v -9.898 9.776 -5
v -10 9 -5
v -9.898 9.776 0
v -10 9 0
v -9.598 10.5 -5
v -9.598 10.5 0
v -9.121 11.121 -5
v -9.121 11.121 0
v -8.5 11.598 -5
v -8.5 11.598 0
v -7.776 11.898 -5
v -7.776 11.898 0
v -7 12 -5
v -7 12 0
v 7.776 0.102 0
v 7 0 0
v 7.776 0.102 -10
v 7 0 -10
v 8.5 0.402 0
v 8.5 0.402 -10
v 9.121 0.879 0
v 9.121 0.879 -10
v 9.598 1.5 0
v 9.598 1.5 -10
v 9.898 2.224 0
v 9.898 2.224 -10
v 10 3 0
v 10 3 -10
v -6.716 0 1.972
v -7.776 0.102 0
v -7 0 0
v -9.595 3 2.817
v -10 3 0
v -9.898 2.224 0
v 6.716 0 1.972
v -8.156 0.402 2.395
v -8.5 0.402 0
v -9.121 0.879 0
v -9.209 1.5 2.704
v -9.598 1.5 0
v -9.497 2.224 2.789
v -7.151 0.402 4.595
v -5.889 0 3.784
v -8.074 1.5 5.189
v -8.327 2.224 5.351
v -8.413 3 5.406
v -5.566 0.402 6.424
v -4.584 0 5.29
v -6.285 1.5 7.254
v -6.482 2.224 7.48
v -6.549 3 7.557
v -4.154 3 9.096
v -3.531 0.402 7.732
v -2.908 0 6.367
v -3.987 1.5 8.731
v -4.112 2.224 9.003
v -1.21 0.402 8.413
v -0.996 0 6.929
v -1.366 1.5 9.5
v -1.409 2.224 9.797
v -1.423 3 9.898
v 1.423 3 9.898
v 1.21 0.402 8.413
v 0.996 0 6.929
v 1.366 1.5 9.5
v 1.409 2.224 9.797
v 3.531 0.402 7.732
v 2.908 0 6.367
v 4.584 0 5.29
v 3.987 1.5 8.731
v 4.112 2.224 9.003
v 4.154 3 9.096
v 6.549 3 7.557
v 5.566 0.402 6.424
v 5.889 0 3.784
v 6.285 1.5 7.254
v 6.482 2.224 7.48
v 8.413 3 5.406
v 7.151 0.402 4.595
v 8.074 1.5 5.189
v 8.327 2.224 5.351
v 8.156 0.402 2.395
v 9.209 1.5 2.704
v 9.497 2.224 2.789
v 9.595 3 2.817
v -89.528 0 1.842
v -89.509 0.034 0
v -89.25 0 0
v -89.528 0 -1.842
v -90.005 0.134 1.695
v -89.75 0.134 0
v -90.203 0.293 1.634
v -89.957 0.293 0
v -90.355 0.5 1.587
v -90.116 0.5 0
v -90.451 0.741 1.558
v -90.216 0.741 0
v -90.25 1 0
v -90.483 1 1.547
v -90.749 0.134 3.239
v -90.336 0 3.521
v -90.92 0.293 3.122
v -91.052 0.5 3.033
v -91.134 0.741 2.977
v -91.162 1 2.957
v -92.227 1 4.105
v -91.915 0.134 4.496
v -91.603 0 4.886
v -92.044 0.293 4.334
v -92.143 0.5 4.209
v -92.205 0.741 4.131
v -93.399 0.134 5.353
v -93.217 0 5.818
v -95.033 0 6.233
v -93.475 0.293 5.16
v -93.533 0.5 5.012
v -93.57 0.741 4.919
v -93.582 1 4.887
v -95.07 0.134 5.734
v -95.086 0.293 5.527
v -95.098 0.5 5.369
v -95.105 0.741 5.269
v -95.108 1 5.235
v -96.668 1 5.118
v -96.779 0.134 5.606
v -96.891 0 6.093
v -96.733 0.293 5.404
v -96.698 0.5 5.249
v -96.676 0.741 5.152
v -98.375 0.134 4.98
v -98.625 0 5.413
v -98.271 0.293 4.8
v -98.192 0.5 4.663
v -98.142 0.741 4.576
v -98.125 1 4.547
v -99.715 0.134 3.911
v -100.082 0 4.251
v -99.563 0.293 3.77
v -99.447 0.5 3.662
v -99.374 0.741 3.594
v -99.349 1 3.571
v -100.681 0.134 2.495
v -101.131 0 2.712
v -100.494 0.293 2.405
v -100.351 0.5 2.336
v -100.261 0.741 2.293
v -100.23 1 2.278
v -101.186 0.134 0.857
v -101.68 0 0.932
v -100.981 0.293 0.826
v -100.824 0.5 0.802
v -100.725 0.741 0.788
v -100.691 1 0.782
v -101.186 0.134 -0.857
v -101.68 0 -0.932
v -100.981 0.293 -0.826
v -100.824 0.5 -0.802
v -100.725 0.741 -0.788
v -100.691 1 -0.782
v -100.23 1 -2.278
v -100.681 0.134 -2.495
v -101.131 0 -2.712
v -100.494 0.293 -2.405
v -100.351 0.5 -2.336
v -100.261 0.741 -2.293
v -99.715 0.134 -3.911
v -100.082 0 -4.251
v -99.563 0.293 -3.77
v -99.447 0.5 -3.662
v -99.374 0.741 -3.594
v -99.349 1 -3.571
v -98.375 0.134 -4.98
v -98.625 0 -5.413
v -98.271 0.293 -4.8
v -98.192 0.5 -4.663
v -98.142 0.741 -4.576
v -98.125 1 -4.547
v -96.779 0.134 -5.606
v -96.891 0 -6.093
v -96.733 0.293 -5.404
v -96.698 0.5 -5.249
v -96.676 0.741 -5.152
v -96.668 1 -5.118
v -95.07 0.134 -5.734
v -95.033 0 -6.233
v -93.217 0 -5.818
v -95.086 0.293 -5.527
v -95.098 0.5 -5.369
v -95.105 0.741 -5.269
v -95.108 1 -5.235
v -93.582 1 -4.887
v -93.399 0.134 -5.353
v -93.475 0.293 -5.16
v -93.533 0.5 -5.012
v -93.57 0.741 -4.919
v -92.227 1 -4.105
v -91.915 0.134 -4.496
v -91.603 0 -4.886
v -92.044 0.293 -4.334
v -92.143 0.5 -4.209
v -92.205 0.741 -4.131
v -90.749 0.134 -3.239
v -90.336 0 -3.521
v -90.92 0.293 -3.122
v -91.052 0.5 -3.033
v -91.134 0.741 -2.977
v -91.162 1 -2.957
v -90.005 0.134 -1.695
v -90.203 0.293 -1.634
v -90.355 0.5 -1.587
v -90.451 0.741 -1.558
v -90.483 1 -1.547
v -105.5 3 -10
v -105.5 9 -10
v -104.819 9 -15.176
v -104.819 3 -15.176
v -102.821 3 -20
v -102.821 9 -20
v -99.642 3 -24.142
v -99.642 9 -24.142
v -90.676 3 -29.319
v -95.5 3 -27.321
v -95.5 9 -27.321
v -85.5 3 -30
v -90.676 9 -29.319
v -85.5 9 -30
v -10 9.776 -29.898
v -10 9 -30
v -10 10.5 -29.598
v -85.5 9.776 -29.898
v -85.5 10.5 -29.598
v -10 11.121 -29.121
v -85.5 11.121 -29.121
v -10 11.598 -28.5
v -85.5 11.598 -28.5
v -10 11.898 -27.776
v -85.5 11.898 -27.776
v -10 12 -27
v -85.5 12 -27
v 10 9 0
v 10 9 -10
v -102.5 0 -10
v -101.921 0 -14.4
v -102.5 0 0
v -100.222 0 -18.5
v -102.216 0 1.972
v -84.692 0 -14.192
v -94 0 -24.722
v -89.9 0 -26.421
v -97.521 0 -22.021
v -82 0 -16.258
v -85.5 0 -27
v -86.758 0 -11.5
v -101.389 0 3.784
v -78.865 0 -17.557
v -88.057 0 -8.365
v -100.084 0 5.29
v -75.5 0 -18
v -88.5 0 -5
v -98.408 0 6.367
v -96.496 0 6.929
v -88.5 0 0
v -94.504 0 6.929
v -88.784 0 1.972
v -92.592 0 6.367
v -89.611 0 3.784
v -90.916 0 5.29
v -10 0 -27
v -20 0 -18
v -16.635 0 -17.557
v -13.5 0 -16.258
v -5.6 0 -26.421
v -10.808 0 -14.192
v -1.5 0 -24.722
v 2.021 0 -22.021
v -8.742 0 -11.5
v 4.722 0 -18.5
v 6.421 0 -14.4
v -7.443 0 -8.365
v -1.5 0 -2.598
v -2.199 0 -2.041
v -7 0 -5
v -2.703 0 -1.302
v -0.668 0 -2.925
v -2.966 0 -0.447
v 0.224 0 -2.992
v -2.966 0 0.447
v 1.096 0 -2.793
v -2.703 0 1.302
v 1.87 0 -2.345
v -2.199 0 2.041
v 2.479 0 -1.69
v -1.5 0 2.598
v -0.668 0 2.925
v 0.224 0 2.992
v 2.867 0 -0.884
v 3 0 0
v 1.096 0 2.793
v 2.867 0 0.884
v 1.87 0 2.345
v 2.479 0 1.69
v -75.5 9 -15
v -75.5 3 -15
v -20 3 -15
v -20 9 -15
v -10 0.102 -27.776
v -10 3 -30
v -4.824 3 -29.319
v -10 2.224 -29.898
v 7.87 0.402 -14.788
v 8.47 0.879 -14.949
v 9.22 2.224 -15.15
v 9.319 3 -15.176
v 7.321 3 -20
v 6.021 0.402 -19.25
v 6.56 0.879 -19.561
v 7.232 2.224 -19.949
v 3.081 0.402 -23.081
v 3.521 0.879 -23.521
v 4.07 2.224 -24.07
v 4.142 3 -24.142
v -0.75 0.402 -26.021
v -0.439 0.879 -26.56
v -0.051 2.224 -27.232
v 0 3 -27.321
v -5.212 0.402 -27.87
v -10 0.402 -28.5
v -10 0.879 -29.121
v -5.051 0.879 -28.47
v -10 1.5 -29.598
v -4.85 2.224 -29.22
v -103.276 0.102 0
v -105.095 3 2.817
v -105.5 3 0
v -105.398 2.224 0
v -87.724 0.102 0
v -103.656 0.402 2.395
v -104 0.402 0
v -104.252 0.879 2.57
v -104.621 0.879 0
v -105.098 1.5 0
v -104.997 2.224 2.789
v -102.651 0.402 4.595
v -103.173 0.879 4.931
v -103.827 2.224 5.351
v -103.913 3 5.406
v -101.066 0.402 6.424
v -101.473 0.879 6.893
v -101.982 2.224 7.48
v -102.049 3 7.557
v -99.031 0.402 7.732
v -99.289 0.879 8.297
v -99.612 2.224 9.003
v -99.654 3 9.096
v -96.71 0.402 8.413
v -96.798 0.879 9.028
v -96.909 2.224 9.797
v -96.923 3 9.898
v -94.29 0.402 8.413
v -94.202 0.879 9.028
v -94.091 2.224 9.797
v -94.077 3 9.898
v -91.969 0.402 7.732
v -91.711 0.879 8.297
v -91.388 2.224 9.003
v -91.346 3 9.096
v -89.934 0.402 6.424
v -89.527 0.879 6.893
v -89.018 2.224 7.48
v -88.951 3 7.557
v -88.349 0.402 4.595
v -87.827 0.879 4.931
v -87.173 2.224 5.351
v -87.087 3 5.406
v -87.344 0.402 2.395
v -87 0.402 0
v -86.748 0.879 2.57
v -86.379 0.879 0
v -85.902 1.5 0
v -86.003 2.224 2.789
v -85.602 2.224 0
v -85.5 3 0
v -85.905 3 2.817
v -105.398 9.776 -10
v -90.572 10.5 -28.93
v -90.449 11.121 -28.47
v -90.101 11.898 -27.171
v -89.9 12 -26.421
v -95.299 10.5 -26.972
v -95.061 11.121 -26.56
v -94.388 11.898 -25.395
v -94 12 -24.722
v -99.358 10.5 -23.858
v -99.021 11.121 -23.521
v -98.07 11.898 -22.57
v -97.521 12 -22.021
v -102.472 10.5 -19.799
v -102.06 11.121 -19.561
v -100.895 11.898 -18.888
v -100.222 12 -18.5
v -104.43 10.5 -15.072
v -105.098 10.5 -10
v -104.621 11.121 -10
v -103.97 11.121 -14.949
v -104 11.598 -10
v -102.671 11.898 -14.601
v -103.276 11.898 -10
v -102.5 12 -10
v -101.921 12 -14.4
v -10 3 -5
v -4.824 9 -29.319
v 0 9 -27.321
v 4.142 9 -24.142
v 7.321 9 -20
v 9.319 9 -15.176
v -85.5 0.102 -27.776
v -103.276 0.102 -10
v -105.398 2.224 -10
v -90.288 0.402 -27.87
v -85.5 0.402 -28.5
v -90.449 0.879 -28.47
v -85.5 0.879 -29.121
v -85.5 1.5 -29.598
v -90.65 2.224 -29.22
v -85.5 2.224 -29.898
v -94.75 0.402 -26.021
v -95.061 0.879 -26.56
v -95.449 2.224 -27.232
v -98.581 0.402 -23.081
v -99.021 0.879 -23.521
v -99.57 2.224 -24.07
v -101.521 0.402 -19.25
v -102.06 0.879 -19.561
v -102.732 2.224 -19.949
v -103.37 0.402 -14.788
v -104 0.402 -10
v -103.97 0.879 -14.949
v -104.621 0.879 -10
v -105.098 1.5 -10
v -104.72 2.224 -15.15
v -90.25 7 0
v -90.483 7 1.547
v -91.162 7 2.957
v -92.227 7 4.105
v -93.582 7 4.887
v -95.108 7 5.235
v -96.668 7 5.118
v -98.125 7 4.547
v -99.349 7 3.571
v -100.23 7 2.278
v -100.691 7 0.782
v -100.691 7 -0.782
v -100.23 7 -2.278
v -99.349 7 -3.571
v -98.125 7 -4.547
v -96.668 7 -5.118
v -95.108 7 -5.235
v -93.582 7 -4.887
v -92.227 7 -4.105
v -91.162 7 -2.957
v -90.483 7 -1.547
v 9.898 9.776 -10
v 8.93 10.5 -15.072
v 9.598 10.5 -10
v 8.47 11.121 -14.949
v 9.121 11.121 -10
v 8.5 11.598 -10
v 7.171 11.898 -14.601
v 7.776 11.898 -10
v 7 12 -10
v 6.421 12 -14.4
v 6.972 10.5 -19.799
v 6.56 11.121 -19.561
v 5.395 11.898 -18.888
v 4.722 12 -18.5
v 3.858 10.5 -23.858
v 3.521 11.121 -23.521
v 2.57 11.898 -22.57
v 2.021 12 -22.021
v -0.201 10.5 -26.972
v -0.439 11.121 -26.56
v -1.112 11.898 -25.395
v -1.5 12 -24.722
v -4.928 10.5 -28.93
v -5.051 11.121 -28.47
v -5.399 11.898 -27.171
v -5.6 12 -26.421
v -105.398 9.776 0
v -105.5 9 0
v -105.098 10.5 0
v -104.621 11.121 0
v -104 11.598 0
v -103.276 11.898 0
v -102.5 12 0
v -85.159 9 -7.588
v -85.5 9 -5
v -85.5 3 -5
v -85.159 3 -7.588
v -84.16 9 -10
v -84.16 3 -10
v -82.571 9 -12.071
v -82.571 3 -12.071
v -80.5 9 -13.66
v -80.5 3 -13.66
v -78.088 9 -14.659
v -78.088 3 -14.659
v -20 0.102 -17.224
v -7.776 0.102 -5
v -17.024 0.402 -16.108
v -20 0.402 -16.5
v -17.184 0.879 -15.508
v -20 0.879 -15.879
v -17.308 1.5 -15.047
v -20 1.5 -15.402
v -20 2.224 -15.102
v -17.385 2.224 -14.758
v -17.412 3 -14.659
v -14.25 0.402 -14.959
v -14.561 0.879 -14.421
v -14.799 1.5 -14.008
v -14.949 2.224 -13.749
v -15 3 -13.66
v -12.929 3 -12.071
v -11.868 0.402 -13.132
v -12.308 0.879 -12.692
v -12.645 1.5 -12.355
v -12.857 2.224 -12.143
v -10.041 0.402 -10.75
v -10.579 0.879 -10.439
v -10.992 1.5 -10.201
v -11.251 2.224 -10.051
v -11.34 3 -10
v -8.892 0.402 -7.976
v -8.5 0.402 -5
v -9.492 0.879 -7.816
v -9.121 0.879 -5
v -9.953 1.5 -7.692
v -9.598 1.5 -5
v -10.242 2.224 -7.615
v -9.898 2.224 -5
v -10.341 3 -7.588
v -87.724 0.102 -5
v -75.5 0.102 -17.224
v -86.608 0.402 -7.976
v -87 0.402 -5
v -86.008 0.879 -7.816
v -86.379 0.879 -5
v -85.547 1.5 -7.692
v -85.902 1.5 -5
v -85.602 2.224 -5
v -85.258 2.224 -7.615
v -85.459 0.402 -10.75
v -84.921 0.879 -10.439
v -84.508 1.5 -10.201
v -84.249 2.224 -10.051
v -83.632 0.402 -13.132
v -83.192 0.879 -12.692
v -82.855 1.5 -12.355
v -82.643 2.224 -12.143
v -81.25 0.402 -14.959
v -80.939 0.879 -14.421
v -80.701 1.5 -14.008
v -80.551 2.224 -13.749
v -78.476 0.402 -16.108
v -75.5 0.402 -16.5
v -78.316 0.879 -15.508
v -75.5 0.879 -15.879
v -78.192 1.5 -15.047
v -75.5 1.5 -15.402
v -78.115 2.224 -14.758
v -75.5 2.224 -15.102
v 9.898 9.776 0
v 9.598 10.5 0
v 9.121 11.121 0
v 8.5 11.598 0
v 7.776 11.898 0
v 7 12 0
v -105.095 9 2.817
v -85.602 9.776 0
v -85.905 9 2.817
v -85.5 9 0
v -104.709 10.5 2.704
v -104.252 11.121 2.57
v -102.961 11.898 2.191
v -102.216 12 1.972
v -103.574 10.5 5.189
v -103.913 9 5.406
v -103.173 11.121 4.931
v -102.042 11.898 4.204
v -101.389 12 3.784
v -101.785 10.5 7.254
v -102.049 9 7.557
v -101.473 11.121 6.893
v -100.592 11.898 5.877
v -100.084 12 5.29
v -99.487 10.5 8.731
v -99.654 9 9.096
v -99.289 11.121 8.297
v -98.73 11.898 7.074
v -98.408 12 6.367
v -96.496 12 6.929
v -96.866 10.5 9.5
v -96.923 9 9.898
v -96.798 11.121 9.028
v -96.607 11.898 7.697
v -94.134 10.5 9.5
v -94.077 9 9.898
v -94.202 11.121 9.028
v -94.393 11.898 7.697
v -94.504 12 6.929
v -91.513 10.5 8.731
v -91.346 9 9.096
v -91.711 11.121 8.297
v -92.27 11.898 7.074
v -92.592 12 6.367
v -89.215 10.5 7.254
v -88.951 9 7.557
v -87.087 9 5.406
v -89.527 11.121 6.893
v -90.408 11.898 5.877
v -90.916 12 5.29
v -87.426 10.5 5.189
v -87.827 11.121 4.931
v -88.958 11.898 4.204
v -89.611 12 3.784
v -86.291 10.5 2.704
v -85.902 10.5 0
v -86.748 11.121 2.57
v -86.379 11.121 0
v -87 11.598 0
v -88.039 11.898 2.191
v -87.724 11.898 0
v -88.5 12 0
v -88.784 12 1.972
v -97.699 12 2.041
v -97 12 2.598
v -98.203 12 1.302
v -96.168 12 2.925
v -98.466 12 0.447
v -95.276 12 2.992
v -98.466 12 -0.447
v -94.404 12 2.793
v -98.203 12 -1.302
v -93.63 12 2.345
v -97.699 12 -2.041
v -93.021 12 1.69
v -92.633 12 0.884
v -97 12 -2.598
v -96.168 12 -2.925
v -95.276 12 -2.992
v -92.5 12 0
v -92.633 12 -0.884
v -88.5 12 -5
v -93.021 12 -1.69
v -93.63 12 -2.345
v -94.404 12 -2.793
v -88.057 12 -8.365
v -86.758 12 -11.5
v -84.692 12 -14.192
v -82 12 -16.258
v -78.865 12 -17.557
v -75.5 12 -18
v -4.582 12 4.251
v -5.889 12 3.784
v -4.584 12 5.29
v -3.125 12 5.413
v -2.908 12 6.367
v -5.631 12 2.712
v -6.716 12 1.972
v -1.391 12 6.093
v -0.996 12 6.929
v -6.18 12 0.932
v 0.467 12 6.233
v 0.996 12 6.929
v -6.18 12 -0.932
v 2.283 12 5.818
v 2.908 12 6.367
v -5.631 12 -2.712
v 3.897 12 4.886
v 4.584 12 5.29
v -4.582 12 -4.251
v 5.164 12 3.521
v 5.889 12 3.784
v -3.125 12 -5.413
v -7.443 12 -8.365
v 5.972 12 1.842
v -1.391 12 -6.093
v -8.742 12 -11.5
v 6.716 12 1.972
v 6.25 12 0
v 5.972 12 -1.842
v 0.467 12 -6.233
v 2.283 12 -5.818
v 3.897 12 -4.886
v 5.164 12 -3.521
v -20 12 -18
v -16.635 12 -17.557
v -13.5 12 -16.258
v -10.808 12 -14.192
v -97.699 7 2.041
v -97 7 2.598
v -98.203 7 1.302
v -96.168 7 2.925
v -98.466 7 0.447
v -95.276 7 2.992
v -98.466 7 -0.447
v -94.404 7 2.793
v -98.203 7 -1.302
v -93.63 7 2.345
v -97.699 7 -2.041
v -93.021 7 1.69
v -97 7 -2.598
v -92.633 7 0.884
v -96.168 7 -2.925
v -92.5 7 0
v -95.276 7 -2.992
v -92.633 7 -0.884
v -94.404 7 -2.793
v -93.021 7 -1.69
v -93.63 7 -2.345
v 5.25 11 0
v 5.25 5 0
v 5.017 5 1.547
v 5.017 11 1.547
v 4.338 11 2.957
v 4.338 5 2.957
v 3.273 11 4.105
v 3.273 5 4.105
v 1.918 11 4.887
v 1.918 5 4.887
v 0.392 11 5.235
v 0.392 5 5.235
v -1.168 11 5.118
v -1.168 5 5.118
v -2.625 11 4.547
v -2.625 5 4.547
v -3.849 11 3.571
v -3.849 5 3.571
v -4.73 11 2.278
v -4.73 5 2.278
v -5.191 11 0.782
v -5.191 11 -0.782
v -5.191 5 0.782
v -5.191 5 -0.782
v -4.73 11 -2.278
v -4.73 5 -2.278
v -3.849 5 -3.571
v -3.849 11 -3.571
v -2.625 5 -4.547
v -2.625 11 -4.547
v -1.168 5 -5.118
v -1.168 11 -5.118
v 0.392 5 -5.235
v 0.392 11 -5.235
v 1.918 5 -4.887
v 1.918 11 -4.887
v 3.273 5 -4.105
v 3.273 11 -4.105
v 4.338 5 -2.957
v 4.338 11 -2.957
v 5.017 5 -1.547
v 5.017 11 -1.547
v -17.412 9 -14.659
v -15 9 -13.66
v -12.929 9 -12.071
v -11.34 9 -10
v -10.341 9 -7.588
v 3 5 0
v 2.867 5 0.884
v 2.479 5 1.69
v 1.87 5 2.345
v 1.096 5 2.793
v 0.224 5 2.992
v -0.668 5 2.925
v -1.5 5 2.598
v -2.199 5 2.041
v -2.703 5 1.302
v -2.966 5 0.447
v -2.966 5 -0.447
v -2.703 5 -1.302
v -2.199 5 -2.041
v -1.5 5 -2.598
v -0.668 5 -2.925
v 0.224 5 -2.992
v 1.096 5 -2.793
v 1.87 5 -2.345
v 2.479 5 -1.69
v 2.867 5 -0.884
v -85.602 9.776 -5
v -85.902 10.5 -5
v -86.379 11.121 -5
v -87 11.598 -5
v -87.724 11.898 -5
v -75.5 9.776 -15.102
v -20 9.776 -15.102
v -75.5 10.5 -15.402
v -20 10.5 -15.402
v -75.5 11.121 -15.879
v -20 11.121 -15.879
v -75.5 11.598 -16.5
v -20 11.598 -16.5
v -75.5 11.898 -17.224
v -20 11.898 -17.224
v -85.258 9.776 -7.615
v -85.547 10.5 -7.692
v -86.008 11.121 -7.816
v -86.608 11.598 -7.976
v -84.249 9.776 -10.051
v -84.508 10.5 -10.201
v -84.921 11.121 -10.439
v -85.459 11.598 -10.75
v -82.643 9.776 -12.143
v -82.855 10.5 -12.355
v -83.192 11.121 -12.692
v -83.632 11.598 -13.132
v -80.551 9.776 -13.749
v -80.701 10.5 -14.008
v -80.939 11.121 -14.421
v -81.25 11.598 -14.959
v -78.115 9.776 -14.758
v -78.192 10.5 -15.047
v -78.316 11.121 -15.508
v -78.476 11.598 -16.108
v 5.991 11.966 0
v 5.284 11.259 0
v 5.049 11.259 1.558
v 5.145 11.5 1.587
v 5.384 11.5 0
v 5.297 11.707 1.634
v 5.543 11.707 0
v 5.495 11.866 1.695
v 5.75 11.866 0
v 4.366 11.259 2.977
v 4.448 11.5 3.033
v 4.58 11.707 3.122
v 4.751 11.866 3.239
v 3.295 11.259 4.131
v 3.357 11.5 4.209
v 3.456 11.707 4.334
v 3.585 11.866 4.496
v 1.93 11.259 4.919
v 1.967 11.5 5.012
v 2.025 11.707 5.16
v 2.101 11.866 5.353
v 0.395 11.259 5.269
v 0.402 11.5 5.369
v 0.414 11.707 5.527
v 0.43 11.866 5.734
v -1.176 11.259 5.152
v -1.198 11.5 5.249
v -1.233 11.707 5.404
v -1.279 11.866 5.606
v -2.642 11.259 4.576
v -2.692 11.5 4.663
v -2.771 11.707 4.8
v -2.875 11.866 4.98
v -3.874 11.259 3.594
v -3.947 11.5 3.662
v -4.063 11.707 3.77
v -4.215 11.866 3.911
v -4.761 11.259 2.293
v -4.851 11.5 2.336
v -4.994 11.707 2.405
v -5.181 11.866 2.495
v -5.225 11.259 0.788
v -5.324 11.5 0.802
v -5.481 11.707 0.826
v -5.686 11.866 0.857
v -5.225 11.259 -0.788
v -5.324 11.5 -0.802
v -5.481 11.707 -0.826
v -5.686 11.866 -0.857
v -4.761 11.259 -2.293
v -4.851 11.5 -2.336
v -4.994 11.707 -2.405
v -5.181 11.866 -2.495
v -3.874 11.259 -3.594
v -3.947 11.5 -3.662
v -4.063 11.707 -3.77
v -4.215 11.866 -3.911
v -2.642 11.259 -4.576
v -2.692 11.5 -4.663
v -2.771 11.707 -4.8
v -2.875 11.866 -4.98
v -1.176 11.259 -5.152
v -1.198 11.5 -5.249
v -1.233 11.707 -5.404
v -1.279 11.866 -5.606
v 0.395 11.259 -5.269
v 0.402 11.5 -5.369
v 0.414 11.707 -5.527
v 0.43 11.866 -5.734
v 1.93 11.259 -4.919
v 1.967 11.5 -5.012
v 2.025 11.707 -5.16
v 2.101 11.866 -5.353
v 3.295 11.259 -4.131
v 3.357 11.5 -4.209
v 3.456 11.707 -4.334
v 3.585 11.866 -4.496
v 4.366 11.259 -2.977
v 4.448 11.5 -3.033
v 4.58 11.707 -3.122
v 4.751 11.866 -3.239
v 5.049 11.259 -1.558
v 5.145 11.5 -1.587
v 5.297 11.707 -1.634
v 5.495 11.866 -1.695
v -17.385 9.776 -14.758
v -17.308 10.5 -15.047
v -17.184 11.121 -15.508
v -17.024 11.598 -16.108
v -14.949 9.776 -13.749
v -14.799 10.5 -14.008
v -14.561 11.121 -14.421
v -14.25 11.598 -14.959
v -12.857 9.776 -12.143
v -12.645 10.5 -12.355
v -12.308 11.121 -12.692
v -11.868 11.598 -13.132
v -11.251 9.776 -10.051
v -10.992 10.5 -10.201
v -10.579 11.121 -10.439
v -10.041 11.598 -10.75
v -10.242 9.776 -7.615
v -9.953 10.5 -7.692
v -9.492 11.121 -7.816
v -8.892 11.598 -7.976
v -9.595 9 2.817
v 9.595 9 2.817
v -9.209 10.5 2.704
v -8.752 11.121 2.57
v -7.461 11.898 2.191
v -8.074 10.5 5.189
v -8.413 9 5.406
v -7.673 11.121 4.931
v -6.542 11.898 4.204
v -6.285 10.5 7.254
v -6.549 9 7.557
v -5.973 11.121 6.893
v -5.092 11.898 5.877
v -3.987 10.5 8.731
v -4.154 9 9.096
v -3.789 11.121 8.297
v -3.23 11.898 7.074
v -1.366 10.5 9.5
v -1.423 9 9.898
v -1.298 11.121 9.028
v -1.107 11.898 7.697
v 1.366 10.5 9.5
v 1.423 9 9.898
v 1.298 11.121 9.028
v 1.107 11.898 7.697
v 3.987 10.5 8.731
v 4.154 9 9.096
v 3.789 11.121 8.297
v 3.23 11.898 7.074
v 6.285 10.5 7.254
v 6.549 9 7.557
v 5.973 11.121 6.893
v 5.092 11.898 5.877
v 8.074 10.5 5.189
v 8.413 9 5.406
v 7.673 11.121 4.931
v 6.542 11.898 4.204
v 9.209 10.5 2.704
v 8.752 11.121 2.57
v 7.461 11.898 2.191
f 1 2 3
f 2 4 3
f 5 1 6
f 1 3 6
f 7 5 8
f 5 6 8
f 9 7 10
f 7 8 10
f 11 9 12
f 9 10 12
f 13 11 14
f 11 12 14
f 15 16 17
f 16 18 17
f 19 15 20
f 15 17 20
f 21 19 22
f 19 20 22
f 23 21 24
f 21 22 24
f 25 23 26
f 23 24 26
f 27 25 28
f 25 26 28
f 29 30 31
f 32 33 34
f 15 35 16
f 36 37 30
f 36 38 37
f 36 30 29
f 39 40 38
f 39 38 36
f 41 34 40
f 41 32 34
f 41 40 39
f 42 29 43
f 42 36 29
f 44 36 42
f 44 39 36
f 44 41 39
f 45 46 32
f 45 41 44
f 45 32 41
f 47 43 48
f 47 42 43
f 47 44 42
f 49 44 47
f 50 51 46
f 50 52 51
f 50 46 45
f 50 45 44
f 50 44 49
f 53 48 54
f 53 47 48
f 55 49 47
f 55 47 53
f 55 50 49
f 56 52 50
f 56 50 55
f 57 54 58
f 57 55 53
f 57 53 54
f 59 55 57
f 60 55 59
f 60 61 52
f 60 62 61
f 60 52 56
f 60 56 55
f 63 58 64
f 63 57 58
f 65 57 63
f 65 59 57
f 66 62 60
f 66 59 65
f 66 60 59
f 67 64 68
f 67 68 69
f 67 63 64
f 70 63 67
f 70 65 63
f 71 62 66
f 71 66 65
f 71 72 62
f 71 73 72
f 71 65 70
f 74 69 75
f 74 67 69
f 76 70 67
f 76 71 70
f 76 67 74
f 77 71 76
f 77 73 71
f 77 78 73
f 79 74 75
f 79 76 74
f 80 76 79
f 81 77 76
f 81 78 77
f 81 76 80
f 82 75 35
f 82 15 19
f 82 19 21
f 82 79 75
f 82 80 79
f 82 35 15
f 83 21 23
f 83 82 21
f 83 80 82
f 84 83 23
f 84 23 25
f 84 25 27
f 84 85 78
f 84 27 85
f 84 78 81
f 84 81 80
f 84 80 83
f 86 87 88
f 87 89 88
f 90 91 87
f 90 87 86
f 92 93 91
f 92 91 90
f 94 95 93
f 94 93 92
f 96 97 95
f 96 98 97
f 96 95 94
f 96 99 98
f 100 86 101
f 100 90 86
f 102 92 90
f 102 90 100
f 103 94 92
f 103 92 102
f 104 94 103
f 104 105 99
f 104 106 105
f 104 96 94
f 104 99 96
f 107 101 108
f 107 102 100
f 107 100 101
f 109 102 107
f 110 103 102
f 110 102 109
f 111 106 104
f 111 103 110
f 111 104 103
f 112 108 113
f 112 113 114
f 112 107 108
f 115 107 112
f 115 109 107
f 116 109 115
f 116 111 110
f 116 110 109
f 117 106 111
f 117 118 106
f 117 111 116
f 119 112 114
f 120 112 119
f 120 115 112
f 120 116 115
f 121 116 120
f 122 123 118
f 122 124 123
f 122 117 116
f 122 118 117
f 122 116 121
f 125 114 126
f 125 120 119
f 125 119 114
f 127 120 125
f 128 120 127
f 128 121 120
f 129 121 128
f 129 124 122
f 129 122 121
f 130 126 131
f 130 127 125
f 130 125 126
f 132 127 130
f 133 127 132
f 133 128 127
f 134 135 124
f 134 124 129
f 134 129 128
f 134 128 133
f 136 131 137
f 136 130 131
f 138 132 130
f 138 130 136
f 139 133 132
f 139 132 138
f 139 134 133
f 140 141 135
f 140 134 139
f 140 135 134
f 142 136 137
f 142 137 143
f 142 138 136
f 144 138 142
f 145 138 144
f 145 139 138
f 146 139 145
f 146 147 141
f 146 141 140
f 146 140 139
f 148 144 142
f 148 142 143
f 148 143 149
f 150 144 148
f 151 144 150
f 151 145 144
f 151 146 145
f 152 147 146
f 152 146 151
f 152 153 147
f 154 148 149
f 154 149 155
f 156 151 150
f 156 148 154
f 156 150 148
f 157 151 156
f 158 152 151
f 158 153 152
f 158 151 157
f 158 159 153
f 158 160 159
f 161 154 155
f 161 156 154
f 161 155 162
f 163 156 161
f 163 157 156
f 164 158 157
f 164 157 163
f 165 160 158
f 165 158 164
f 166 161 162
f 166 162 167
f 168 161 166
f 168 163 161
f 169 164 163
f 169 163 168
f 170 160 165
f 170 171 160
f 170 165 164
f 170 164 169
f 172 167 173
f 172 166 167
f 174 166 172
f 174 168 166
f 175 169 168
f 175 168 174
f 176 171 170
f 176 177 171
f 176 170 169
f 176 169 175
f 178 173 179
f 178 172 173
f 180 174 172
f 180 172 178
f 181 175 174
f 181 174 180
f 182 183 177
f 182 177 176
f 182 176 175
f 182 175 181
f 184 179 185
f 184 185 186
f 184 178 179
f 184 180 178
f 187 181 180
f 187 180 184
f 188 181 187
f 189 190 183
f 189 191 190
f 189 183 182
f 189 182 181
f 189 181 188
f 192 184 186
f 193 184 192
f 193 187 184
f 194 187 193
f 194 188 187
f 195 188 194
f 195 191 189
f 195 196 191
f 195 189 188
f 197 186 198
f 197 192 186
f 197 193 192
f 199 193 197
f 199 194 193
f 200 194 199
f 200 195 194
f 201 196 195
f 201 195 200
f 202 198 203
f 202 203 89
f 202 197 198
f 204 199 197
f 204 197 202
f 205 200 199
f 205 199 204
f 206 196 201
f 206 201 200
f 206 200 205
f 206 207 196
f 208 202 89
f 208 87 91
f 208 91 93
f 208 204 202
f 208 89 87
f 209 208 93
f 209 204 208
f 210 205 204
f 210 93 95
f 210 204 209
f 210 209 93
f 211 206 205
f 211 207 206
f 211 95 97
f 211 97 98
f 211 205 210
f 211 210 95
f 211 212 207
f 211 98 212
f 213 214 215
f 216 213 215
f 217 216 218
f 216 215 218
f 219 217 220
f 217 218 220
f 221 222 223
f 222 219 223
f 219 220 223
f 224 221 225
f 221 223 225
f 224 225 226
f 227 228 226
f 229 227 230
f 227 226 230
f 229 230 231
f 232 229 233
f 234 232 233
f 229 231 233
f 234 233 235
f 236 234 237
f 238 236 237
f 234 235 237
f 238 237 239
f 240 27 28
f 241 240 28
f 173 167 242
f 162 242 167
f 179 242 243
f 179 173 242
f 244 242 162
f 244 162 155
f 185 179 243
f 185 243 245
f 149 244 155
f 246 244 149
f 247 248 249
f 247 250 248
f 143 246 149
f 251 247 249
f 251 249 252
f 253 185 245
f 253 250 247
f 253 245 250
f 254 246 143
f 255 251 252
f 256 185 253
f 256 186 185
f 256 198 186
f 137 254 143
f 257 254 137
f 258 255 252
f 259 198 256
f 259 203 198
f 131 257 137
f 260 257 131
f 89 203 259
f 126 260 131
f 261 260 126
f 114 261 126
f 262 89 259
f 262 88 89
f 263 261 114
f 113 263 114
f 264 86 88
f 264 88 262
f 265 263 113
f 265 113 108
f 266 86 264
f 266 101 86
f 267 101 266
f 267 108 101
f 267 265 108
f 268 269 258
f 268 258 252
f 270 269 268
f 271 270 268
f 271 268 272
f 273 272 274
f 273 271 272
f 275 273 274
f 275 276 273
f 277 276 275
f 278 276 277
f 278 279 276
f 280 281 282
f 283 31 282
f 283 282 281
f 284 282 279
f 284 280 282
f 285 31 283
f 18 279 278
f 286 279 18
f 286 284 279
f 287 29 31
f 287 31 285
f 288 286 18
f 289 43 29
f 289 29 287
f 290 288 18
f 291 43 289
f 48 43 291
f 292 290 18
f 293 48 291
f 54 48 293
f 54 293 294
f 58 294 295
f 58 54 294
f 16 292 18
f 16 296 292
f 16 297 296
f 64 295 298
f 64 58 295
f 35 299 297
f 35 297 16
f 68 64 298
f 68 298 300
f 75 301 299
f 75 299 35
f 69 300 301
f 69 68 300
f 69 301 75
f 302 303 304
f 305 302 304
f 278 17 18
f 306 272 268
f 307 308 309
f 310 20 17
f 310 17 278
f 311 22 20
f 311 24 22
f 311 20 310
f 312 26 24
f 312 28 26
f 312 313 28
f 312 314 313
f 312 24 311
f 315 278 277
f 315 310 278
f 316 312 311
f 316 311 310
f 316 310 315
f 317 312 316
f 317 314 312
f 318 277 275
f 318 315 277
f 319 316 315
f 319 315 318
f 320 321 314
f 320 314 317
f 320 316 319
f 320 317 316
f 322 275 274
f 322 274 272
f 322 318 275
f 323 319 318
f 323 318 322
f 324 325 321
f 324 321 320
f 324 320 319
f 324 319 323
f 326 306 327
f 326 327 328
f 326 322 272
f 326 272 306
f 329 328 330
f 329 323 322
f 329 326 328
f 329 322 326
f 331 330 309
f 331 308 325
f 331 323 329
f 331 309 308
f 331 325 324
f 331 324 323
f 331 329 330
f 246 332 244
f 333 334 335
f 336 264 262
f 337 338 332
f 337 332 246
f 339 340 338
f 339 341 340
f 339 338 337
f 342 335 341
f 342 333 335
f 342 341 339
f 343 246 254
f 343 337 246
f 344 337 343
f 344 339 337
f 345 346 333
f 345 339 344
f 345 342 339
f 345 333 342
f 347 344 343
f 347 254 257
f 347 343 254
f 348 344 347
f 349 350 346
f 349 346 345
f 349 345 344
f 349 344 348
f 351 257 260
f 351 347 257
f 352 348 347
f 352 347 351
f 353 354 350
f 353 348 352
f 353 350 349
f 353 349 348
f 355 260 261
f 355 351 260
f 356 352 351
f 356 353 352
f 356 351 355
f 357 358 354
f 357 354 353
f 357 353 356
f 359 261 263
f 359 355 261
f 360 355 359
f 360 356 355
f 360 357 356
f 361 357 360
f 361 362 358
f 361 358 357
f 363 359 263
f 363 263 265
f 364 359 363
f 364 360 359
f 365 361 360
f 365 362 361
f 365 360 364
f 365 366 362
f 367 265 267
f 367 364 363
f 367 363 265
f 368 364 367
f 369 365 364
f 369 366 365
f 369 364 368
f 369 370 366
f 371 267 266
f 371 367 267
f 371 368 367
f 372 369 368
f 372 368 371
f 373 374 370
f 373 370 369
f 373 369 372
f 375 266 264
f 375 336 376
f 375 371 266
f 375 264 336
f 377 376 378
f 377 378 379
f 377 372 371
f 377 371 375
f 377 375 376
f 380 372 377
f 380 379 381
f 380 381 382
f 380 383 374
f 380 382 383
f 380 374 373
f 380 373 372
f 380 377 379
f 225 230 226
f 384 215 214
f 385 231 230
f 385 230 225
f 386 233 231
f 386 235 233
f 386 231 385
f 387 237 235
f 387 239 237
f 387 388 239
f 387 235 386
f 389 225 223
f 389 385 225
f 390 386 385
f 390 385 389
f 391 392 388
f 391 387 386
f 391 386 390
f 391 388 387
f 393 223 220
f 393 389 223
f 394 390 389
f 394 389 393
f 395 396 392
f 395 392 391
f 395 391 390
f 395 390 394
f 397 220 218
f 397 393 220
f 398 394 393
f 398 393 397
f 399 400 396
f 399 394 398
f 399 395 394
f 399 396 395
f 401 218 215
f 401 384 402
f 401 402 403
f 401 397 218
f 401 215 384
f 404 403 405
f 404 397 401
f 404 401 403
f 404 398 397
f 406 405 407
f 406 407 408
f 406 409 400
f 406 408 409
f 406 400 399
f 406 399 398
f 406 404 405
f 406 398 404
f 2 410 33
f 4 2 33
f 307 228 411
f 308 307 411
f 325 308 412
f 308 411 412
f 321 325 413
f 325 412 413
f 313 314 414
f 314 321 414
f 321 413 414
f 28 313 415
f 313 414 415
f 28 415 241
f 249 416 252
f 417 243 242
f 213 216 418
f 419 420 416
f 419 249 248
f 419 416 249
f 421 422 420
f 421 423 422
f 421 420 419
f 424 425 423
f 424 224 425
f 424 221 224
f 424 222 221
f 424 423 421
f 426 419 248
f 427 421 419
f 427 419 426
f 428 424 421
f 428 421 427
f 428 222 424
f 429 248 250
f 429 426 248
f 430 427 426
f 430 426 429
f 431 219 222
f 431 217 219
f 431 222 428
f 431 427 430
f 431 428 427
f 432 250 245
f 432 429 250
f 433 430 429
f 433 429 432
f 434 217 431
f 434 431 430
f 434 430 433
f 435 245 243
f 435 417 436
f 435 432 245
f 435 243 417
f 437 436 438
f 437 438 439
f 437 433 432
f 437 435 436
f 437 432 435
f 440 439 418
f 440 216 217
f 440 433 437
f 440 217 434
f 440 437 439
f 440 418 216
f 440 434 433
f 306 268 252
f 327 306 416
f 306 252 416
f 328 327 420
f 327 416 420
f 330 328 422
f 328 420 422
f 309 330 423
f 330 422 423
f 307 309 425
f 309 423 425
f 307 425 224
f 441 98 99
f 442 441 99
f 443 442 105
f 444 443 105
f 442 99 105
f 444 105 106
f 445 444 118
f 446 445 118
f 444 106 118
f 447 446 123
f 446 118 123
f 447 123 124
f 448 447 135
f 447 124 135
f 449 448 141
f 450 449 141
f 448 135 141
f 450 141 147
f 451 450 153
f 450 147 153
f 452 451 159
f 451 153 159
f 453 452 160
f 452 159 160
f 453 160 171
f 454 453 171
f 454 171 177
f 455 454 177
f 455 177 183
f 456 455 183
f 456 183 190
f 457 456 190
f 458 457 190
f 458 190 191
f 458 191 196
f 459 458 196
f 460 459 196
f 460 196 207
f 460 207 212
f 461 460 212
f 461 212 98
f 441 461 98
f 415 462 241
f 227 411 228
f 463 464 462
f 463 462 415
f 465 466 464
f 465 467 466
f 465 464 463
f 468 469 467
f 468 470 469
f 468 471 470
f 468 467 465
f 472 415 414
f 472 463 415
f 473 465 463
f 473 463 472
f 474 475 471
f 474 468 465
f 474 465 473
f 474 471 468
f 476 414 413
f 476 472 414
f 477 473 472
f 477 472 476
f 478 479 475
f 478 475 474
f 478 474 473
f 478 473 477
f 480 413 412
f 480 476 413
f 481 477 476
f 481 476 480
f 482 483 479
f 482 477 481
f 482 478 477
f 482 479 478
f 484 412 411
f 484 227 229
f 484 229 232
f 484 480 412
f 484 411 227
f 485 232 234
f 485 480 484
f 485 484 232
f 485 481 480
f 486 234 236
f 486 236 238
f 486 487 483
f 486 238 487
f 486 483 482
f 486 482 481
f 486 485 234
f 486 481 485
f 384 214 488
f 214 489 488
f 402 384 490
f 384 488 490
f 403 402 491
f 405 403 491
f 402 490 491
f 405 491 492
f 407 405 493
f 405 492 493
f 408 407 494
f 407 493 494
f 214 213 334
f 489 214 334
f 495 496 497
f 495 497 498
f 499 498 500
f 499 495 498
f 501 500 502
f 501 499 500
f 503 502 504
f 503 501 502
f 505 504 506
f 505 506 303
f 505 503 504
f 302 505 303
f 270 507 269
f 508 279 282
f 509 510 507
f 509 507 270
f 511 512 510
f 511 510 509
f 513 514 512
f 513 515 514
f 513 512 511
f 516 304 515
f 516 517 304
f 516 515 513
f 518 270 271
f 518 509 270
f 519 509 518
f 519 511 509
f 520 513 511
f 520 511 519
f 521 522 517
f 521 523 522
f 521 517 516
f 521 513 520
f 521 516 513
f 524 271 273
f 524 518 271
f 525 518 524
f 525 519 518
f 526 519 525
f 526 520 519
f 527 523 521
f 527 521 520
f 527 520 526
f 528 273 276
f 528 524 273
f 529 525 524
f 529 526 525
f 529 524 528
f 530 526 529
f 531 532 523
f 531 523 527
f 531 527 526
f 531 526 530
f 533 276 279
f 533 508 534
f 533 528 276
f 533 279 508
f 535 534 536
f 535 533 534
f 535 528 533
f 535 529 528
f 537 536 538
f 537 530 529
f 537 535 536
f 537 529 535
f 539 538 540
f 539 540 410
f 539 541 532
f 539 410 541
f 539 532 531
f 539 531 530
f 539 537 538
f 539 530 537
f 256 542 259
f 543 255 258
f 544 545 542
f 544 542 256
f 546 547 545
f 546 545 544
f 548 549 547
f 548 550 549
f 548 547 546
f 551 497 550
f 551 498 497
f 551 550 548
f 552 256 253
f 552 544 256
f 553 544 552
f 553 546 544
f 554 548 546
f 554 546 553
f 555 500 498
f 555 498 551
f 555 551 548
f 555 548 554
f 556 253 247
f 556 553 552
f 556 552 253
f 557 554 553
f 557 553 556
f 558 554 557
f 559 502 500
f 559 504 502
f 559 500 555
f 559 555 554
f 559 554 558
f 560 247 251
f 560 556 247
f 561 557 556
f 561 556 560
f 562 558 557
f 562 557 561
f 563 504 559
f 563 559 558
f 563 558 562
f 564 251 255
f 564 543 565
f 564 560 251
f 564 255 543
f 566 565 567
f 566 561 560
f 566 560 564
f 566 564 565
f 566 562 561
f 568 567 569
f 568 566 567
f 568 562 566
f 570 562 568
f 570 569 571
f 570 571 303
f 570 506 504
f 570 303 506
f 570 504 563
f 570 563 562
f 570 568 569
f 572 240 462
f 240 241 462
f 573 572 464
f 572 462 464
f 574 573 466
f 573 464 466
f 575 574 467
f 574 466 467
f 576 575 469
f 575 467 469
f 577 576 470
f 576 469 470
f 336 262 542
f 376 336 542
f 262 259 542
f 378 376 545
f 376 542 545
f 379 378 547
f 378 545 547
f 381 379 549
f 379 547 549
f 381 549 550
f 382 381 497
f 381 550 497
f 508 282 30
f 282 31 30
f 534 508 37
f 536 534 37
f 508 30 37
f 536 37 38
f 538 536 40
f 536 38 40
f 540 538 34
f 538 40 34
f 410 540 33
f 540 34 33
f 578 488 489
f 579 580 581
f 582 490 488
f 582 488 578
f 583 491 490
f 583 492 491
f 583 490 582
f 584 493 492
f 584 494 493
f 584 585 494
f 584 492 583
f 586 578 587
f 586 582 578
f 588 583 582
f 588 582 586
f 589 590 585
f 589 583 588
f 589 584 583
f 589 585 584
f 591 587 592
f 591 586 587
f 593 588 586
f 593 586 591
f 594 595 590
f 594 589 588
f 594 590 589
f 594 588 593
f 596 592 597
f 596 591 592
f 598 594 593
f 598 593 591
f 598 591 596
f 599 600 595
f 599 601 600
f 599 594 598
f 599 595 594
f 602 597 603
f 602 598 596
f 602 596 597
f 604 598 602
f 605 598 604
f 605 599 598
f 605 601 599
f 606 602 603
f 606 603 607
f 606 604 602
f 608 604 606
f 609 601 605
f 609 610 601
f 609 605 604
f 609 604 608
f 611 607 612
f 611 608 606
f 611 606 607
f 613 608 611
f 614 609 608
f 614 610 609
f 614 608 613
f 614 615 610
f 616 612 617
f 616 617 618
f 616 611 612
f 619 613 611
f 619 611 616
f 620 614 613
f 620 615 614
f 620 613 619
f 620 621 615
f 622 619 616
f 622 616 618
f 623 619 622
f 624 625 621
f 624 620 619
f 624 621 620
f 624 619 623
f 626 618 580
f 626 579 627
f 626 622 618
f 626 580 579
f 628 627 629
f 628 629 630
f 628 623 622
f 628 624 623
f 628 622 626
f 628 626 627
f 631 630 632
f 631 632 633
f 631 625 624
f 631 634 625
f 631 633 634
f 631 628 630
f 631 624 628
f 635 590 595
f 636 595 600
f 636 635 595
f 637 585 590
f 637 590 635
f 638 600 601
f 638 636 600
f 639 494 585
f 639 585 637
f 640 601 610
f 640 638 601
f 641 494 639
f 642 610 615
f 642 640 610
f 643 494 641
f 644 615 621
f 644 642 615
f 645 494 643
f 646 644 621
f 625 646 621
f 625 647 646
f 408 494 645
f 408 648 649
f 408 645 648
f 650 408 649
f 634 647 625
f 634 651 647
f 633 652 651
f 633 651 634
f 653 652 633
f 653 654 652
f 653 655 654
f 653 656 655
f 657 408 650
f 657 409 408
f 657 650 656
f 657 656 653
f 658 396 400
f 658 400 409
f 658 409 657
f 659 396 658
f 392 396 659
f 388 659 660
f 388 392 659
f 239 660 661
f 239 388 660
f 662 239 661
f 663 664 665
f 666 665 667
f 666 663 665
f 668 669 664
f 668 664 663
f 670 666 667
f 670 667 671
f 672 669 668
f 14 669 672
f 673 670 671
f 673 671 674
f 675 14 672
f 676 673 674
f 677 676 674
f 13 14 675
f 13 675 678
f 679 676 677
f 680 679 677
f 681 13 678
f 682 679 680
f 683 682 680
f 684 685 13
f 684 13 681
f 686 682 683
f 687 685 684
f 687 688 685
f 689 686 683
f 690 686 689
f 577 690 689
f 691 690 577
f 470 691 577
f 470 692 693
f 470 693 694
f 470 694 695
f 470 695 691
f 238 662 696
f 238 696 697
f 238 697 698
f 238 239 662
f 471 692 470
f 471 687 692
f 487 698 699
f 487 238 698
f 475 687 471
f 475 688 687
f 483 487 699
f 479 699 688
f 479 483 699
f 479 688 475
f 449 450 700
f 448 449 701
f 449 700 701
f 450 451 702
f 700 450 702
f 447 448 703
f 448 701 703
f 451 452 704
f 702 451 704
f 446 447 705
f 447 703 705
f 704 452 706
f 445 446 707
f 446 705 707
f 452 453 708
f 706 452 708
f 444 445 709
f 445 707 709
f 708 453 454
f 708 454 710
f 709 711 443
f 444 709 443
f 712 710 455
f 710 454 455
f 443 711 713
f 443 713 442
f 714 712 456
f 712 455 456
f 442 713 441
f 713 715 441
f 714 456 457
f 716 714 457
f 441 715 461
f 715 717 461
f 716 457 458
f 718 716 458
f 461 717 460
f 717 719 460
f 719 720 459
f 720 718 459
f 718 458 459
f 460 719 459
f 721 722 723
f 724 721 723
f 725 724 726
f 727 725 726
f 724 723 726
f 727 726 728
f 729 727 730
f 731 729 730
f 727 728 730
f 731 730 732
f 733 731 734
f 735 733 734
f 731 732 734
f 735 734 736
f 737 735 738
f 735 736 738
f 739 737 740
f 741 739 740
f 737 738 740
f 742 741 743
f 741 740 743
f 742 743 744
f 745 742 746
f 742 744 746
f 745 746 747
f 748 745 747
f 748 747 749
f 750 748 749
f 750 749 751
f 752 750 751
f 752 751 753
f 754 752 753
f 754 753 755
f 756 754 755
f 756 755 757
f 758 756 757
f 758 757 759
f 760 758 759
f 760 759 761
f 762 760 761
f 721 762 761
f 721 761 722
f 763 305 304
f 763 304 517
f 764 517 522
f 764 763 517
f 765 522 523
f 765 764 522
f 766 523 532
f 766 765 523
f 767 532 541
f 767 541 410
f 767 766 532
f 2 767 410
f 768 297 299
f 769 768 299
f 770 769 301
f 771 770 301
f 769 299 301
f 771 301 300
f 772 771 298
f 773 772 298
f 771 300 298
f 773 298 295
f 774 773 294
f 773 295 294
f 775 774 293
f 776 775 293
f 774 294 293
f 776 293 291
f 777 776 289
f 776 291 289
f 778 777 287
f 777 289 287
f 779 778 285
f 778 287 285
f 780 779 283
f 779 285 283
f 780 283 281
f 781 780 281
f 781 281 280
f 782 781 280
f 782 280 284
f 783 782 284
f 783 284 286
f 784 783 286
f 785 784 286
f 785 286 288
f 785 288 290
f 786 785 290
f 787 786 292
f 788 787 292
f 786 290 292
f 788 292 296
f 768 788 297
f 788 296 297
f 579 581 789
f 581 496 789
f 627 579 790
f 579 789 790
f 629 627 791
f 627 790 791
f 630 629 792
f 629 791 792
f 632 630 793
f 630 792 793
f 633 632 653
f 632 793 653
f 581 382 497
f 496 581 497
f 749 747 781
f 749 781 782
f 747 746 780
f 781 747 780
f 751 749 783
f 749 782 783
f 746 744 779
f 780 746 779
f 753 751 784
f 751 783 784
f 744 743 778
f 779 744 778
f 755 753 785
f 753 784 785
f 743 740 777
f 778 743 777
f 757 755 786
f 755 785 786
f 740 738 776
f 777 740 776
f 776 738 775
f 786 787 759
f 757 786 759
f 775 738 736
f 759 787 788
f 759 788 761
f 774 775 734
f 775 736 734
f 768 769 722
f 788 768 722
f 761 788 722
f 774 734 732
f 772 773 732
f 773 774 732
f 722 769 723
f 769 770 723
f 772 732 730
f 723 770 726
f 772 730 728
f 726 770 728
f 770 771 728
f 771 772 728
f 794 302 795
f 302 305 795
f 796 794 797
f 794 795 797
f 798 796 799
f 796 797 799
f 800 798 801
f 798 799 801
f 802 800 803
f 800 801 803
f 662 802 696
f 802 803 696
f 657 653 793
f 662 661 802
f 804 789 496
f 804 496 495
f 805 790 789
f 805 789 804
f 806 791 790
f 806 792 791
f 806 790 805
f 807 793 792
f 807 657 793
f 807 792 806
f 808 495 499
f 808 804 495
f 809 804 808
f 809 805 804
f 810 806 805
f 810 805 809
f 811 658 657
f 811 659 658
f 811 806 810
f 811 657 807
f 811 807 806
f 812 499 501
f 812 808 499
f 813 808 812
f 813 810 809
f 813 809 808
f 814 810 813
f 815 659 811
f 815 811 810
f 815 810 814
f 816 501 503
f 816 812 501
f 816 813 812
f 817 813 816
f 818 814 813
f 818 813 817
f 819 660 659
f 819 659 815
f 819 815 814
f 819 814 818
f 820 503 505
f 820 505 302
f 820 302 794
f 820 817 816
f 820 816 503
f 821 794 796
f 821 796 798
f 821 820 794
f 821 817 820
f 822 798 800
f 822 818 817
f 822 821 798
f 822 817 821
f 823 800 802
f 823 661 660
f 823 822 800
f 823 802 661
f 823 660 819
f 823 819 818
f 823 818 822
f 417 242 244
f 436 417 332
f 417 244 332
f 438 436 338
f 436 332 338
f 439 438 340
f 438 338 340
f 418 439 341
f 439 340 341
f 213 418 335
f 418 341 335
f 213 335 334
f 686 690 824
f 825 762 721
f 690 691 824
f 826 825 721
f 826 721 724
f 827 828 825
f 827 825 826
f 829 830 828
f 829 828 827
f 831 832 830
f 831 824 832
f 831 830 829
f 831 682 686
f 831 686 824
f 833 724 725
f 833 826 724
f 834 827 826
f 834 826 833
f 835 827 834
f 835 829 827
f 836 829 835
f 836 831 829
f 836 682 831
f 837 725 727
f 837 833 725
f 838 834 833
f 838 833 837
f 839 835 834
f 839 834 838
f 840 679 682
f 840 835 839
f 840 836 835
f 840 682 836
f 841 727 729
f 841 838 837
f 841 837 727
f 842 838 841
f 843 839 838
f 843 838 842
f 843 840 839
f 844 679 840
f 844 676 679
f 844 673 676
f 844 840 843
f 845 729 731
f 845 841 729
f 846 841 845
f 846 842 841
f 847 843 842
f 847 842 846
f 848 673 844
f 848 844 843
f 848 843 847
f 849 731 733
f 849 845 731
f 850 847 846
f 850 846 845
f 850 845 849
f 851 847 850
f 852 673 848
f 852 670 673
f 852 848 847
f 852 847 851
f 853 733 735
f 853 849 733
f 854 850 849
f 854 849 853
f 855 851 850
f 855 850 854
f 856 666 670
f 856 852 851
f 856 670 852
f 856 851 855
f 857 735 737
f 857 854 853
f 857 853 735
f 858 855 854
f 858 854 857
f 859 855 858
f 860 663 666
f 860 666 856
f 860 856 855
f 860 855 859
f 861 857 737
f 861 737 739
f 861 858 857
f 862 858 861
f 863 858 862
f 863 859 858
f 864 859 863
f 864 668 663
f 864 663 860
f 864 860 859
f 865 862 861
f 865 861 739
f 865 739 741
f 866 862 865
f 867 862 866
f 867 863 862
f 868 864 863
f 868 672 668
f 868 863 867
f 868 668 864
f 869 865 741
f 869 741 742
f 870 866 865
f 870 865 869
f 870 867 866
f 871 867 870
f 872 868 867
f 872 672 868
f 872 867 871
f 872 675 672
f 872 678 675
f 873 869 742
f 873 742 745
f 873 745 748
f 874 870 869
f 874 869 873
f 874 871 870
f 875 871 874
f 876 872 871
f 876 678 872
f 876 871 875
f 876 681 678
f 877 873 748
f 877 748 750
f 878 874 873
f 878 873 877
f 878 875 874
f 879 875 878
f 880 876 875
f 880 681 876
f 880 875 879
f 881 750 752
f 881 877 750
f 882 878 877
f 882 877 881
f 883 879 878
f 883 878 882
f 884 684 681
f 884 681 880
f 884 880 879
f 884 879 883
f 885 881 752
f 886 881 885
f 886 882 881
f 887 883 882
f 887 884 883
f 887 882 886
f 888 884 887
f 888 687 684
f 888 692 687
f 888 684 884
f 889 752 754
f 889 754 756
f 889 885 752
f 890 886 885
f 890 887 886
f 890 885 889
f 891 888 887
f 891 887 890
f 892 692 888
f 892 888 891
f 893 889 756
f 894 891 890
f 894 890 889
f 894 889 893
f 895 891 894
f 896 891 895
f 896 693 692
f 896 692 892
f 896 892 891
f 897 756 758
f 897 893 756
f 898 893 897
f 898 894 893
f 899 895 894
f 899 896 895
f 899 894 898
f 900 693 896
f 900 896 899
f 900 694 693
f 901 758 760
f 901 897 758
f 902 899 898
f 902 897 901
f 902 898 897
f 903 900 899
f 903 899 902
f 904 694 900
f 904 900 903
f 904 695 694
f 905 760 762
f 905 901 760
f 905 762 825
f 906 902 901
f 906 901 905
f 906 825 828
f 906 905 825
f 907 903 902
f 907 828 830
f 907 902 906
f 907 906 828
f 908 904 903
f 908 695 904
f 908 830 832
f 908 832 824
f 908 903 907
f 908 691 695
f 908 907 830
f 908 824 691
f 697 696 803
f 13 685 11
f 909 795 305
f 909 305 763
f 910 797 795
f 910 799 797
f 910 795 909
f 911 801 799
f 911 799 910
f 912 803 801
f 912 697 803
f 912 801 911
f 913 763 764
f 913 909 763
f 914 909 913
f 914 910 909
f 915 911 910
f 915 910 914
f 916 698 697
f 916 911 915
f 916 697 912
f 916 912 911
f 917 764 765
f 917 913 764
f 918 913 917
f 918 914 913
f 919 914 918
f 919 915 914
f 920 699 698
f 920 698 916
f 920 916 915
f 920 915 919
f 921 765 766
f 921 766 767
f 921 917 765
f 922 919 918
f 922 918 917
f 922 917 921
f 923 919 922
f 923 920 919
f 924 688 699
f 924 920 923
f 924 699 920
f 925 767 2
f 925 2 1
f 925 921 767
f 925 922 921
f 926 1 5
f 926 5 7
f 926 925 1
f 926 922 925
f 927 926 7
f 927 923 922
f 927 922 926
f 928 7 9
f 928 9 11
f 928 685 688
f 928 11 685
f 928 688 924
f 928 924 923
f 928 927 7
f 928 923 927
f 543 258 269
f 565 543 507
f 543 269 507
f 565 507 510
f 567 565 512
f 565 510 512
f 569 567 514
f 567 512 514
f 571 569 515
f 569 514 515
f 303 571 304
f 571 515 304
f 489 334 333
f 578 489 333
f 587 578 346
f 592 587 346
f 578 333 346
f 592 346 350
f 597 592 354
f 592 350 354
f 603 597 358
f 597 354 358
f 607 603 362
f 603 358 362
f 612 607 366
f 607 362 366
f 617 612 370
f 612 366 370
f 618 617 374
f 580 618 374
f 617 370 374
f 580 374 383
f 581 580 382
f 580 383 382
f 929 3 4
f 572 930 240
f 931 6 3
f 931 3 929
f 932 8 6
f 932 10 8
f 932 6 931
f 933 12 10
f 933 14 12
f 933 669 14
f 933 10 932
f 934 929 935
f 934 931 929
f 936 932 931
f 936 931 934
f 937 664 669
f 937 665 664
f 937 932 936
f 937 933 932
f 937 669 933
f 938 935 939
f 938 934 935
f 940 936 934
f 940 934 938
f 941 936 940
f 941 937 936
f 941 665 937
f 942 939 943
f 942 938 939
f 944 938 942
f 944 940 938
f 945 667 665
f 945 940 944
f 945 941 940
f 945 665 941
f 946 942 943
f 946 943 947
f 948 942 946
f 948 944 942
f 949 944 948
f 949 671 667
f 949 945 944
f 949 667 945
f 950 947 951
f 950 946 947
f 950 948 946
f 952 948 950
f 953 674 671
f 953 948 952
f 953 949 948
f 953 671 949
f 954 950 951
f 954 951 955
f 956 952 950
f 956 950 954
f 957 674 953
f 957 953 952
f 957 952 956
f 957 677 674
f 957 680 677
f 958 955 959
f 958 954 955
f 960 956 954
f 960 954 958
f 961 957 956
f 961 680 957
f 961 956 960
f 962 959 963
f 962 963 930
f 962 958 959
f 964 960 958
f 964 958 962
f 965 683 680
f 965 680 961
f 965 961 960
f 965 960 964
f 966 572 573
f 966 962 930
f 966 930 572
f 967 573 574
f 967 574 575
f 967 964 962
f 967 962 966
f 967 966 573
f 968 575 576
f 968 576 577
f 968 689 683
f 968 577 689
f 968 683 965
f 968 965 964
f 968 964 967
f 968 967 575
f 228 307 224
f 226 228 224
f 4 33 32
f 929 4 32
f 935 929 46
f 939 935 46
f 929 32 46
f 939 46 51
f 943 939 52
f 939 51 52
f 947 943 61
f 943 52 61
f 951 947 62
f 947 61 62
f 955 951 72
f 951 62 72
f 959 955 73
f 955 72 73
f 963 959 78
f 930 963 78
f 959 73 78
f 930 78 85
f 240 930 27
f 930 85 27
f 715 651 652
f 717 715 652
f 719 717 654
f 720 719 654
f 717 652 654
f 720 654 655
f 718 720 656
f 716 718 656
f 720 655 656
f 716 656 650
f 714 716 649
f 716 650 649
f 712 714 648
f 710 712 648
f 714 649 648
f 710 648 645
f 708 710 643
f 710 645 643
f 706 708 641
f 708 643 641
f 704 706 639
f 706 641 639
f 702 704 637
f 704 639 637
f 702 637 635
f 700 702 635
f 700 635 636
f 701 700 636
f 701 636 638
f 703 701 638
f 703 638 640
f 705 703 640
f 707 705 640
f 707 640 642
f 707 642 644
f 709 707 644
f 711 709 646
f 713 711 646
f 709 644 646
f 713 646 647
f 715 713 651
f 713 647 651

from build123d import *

# Parameters (mm, degrees)
SKETCH7_R           = 5
BOSS_EXTRUDE5_DEPTH = 12
FILLET2_R           = 20
FILLET3_R           = 10
FILLET5_R           = 3
SKETCH11_R          = 5.25
CUT_EXTRUDE1_DEPTH  = 36
FILLET6_R           = 1
SKETCH12_R          = 6.25
SKETCH12_R_2        = 3
BOSS_EXTRUDE6_DEPTH = 5
SKETCH13_R          = 6.25
SKETCH13_R_2        = 3
BOSS_EXTRUDE7_DEPTH = 5


with BuildPart() as part:
    # Sketch7 → Boss-Extrude5 (new body)
    with BuildSketch(Plane(origin=(0, 0, 0), x_dir=(1, 0, 0), z_dir=(0, 1, 0))):
        with BuildLine():
            Line((-105.5, 30), (-105.5, 0))
            ThreePointArc((-105.5, 0), (-95.5, -10), (-85.5, 0))
            Line((-85.5, 0), (-85.5, 15))
            Line((-85.5, 15), (-10, 15))
            Line((-10, 15), (-10, 0))
            ThreePointArc((-10, 0), (0, -10), (10, 0))
            Line((10, 0), (10, 30))
            Line((10, 30), (-10, 30))
            Line((-10, 30), (-85.5, 30))
            Line((-85.5, 30), (-105.5, 30))
        make_face()
        with Locations((-95.5, 0)):
            Circle(SKETCH7_R, mode=Mode.SUBTRACT)
    extrude(amount=BOSS_EXTRUDE5_DEPTH)

    # Fillet2
    fillet2_edges = [part.edges().sort_by_distance(p)[0] for p in [
        (-105.5, 6, -30),
        (10, 6, -30),
    ]]
    fillet(fillet2_edges, radius=FILLET2_R)

    # Fillet3
    fillet3_edges = [part.edges().sort_by_distance(p)[0] for p in [
        (-10, 6, -15),
        (-85.5, 6, -15),
    ]]
    fillet(fillet3_edges, radius=FILLET3_R)

    # Fillet5
    fillet5_edges = [part.edges().sort_by_distance(p)[0] for p in [
        (10, 0, -5),
        (-105.5, 12, -5),
        (0, 0, 10),
        (-10, 0, -2.5),
        (-85.5, 0, -2.5),
        (-95.5, 0, 10),
        (-105.5, 0, -5),
        (-95.5, 12, 10),
        (-85.5, 12, -2.5),
        (-47.75, 0, -30),
        (-47.75, 12, -30),
        (-10, 12, -2.5),
        (-99.642135624, 0, -24.142135624),
        (4.142135624, 0, -24.142135624),
        (-99.642135624, 12, -24.142135624),
        (4.142135624, 12, -24.142135624),
        (0, 12, 10),
        (10, 12, -5),
        (-47.75, 0, -15),
        (-47.75, 12, -15),
        (-12.928932188, 0, -12.071067812),
        (-12.928932188, 12, -12.071067812),
        (-82.571067812, 0, -12.071067812),
        (-82.571067812, 12, -12.071067812),
    ]]
    fillet(fillet5_edges, radius=FILLET5_R)

    # Sketch11 → Cut-Extrude1 (cut)
    with BuildSketch(Plane.XZ):
        with Locations((-95.5, 0)):
            Circle(SKETCH11_R)
        Circle(SKETCH11_R)
    extrude(amount=-CUT_EXTRUDE1_DEPTH, mode=Mode.SUBTRACT)

    # Fillet6
    fillet6_edges = [part.edges().sort_by_distance(p)[0] for p in [
        (-100.75, 12, 0),
        (-100.75, 0, 0),
        (-5.25, 12, 0),
        (-5.25, 0, 0),
    ]]
    fillet(fillet6_edges, radius=FILLET6_R)

    # Sketch12 → Boss-Extrude6 (add)
    with BuildSketch(Plane(origin=(0, 12, 0), x_dir=(1, 0, 0), z_dir=(0, 1, 0))):
        with Locations((-95.5, 0)):
            Circle(SKETCH12_R)
        with Locations((-95.5, 0)):
            Circle(SKETCH12_R_2, mode=Mode.SUBTRACT)
    extrude(amount=-BOSS_EXTRUDE6_DEPTH)

    # Sketch13 → Boss-Extrude7 (add)
    with BuildSketch(Plane.XZ):
        Circle(SKETCH13_R)
        Circle(SKETCH13_R_2, mode=Mode.SUBTRACT)
    extrude(amount=-BOSS_EXTRUDE7_DEPTH)


solid = part.part
